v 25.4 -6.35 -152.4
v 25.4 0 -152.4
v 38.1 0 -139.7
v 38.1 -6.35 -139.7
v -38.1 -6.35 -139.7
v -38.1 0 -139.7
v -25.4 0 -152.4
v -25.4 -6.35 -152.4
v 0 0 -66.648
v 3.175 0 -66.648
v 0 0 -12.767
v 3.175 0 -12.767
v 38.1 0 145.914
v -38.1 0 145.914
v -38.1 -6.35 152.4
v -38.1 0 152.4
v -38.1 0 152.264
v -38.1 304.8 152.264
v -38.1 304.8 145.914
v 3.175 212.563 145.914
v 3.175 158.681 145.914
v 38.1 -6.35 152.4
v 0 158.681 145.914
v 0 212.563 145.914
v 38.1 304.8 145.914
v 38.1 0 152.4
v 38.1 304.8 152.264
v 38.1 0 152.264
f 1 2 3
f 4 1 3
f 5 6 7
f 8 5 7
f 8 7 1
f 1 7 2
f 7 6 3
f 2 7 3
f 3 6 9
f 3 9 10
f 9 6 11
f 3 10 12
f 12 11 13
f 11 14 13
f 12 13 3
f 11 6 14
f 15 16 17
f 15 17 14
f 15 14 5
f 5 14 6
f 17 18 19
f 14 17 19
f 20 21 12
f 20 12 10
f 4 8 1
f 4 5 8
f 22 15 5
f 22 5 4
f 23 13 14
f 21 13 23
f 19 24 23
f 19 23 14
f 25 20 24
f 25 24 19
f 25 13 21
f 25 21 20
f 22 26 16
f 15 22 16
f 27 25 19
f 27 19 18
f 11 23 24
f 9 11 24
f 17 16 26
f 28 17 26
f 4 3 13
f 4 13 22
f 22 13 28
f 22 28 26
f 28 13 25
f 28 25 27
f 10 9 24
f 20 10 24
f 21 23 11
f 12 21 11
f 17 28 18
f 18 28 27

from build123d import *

# Parameters (mm, degrees)
F1_DEPTH = 6.35
F3_W     = 304.8
F3_H     = 6.35
F4_DEPTH = 76.2
F6_DEPTH = 3.175
F7_DEPTH = 3.175


with BuildPart() as f1:
    # F0 (on Front) → F1 (new body)
    with BuildSketch(Plane.XZ):
        Polygon((-25.4, -152.4), (25.4, -152.4), (38.1, -139.7), (38.1, 152.4), (-38.1, 152.4), (-38.1, -139.7), align=None)
    extrude(amount=F1_DEPTH)

    # F3 (on offset) → F4 (join)
    with BuildSketch(Plane.YZ.offset(38.1)):
        with Locations((152.4, 149.089498)):
            Rectangle(F3_W, F3_H)
    extrude(amount=-F4_DEPTH)

    # F5 (on Right) → F6 (join)
    with BuildSketch(Plane.YZ):
        Polygon((0, -66.648165), (212.562662, 145.914498), (158.681126, 145.914498), (0, -12.766628), align=None)
    extrude(amount=F6_DEPTH)

    # F5 (on Right) → F7 (join)
    with BuildSketch(Plane.YZ):
        Polygon((0, -66.648165), (212.562662, 145.914498), (158.681126, 145.914498), (0, -12.766628), align=None)
    extrude(amount=F7_DEPTH)


solid = f1.part
